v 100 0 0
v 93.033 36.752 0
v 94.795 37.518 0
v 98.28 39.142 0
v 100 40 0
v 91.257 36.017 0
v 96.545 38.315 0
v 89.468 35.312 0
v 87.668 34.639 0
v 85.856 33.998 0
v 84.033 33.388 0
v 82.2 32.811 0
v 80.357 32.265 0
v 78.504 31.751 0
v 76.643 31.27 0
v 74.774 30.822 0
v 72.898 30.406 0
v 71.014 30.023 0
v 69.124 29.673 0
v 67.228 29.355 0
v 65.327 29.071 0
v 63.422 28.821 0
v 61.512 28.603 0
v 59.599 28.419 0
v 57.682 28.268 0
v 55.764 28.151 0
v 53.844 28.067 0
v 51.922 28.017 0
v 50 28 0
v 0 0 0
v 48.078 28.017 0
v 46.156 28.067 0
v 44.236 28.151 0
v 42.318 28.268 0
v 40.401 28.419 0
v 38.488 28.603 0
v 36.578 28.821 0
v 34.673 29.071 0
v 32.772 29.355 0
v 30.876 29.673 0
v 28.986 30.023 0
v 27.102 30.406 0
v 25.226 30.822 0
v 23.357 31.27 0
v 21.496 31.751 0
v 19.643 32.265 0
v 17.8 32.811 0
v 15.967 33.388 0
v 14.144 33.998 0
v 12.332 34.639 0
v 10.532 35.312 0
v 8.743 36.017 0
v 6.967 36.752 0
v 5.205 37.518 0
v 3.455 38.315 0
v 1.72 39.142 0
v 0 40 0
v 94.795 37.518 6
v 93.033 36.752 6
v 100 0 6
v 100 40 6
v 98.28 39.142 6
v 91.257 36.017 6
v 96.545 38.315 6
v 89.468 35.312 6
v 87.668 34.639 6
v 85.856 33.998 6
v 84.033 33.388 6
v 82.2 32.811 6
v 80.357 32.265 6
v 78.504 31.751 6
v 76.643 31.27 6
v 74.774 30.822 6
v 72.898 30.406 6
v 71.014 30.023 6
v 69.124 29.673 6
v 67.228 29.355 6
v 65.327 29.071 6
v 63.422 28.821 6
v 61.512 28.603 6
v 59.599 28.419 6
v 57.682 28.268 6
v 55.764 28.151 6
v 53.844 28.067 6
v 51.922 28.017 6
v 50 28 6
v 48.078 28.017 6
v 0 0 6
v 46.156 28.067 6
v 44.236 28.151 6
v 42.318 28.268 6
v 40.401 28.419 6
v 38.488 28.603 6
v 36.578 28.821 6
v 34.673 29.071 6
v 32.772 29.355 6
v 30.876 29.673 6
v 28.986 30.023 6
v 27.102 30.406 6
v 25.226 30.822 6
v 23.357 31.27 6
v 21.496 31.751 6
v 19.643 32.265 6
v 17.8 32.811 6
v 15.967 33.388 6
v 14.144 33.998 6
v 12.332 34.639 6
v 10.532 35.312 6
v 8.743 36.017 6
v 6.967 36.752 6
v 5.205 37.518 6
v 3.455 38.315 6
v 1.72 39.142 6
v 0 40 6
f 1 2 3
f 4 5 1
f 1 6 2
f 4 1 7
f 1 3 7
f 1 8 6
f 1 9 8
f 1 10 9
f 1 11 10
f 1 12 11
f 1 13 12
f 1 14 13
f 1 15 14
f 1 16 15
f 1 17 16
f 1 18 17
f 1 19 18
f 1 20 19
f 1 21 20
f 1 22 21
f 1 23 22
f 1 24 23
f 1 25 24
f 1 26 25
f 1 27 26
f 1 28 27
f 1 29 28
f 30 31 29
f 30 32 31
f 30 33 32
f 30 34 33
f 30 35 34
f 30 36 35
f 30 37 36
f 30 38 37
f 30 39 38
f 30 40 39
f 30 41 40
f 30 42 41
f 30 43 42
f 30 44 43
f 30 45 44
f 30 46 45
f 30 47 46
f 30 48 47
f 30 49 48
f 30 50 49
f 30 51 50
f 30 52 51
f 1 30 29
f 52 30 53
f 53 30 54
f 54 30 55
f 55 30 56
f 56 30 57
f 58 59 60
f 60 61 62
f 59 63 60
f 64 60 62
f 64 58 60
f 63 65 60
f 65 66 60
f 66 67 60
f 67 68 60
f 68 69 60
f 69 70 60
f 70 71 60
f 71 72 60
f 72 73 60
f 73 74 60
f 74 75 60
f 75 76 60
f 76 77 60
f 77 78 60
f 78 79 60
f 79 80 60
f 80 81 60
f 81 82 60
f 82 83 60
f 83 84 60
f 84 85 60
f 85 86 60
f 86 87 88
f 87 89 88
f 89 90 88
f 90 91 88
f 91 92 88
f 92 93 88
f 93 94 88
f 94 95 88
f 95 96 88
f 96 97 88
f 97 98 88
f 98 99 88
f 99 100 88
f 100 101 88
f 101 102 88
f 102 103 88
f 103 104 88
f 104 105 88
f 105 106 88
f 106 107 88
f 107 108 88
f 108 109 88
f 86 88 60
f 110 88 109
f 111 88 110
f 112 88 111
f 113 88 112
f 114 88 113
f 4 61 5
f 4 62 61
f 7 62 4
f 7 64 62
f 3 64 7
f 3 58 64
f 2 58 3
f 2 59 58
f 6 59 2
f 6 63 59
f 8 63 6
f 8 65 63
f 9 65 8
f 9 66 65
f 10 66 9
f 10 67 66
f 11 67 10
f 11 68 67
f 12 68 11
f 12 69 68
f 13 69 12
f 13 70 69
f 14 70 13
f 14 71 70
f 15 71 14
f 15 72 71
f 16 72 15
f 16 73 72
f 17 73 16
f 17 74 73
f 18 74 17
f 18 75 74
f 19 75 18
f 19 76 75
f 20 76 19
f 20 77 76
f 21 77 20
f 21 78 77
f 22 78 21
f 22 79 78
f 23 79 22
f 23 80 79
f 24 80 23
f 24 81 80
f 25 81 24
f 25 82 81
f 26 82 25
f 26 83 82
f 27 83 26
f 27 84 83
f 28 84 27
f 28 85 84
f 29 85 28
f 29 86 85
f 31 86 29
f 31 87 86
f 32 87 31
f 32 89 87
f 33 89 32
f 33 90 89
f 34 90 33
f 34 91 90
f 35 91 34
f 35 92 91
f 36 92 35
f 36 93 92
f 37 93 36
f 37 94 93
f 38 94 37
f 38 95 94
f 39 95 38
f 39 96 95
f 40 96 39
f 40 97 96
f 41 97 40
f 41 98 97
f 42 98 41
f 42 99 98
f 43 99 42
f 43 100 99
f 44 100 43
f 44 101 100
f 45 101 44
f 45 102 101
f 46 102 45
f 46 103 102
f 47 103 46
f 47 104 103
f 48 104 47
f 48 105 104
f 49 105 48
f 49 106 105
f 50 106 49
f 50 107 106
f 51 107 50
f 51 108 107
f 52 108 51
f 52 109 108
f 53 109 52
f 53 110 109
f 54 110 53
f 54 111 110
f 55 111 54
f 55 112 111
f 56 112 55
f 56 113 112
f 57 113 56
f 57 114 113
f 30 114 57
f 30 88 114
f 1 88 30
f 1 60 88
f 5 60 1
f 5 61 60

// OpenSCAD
$fn = 32;

// ----------------------------------------------------------------------
// Arc profile plate: notch, 57 points
// ----------------------------------------------------------------------

// --- parameters (mm) ---
bar_l = 100;              // bar length, X
bar_w = 40;               // bar width, Y
notch_depth = 12;         // depth of the arc notch at mid-span
arc_r = 110.17;           // radius of the notch arc
arc_angle = 53.98;        // notch arc angle, degrees
arc_step = 1;             // sampling step of the notch arc, degrees
plate_t = 6;              // plate thickness, Z

profile = [[0, 0], [100, 0], [100, 40], [98.28, 39.142], [96.545, 38.315], [94.795, 37.518], [93.033, 36.752], [91.257, 36.017], [89.468, 35.312], [87.668, 34.639], [85.856, 33.998], [84.033, 33.388], [82.2, 32.811], [80.357, 32.265], [78.504, 31.751], [76.643, 31.27], [74.774, 30.822], [72.898, 30.406], [71.014, 30.023], [69.124, 29.673], [67.228, 29.355], [65.327, 29.071], [63.422, 28.821], [61.512, 28.603], [59.599, 28.419], [57.682, 28.268], [55.764, 28.151], [53.844, 28.067], [51.922, 28.017], [50, 28], [48.078, 28.017], [46.156, 28.067], [44.236, 28.151], [42.318, 28.268], [40.401, 28.419], [38.488, 28.603], [36.578, 28.821], [34.673, 29.071], [32.772, 29.355], [30.876, 29.673], [28.986, 30.023], [27.102, 30.406], [25.226, 30.822], [23.357, 31.27], [21.496, 31.751], [19.643, 32.265], [17.8, 32.811], [15.967, 33.388], [14.144, 33.998], [12.332, 34.639], [10.532, 35.312], [8.743, 36.017], [6.967, 36.752], [5.205, 37.518], [3.455, 38.315], [1.72, 39.142], [0, 40]];  // primary outline, 57 points, counter clockwise

// --- the one profile operation ---
linear_extrude(height = plate_t) polygon(points = profile);
